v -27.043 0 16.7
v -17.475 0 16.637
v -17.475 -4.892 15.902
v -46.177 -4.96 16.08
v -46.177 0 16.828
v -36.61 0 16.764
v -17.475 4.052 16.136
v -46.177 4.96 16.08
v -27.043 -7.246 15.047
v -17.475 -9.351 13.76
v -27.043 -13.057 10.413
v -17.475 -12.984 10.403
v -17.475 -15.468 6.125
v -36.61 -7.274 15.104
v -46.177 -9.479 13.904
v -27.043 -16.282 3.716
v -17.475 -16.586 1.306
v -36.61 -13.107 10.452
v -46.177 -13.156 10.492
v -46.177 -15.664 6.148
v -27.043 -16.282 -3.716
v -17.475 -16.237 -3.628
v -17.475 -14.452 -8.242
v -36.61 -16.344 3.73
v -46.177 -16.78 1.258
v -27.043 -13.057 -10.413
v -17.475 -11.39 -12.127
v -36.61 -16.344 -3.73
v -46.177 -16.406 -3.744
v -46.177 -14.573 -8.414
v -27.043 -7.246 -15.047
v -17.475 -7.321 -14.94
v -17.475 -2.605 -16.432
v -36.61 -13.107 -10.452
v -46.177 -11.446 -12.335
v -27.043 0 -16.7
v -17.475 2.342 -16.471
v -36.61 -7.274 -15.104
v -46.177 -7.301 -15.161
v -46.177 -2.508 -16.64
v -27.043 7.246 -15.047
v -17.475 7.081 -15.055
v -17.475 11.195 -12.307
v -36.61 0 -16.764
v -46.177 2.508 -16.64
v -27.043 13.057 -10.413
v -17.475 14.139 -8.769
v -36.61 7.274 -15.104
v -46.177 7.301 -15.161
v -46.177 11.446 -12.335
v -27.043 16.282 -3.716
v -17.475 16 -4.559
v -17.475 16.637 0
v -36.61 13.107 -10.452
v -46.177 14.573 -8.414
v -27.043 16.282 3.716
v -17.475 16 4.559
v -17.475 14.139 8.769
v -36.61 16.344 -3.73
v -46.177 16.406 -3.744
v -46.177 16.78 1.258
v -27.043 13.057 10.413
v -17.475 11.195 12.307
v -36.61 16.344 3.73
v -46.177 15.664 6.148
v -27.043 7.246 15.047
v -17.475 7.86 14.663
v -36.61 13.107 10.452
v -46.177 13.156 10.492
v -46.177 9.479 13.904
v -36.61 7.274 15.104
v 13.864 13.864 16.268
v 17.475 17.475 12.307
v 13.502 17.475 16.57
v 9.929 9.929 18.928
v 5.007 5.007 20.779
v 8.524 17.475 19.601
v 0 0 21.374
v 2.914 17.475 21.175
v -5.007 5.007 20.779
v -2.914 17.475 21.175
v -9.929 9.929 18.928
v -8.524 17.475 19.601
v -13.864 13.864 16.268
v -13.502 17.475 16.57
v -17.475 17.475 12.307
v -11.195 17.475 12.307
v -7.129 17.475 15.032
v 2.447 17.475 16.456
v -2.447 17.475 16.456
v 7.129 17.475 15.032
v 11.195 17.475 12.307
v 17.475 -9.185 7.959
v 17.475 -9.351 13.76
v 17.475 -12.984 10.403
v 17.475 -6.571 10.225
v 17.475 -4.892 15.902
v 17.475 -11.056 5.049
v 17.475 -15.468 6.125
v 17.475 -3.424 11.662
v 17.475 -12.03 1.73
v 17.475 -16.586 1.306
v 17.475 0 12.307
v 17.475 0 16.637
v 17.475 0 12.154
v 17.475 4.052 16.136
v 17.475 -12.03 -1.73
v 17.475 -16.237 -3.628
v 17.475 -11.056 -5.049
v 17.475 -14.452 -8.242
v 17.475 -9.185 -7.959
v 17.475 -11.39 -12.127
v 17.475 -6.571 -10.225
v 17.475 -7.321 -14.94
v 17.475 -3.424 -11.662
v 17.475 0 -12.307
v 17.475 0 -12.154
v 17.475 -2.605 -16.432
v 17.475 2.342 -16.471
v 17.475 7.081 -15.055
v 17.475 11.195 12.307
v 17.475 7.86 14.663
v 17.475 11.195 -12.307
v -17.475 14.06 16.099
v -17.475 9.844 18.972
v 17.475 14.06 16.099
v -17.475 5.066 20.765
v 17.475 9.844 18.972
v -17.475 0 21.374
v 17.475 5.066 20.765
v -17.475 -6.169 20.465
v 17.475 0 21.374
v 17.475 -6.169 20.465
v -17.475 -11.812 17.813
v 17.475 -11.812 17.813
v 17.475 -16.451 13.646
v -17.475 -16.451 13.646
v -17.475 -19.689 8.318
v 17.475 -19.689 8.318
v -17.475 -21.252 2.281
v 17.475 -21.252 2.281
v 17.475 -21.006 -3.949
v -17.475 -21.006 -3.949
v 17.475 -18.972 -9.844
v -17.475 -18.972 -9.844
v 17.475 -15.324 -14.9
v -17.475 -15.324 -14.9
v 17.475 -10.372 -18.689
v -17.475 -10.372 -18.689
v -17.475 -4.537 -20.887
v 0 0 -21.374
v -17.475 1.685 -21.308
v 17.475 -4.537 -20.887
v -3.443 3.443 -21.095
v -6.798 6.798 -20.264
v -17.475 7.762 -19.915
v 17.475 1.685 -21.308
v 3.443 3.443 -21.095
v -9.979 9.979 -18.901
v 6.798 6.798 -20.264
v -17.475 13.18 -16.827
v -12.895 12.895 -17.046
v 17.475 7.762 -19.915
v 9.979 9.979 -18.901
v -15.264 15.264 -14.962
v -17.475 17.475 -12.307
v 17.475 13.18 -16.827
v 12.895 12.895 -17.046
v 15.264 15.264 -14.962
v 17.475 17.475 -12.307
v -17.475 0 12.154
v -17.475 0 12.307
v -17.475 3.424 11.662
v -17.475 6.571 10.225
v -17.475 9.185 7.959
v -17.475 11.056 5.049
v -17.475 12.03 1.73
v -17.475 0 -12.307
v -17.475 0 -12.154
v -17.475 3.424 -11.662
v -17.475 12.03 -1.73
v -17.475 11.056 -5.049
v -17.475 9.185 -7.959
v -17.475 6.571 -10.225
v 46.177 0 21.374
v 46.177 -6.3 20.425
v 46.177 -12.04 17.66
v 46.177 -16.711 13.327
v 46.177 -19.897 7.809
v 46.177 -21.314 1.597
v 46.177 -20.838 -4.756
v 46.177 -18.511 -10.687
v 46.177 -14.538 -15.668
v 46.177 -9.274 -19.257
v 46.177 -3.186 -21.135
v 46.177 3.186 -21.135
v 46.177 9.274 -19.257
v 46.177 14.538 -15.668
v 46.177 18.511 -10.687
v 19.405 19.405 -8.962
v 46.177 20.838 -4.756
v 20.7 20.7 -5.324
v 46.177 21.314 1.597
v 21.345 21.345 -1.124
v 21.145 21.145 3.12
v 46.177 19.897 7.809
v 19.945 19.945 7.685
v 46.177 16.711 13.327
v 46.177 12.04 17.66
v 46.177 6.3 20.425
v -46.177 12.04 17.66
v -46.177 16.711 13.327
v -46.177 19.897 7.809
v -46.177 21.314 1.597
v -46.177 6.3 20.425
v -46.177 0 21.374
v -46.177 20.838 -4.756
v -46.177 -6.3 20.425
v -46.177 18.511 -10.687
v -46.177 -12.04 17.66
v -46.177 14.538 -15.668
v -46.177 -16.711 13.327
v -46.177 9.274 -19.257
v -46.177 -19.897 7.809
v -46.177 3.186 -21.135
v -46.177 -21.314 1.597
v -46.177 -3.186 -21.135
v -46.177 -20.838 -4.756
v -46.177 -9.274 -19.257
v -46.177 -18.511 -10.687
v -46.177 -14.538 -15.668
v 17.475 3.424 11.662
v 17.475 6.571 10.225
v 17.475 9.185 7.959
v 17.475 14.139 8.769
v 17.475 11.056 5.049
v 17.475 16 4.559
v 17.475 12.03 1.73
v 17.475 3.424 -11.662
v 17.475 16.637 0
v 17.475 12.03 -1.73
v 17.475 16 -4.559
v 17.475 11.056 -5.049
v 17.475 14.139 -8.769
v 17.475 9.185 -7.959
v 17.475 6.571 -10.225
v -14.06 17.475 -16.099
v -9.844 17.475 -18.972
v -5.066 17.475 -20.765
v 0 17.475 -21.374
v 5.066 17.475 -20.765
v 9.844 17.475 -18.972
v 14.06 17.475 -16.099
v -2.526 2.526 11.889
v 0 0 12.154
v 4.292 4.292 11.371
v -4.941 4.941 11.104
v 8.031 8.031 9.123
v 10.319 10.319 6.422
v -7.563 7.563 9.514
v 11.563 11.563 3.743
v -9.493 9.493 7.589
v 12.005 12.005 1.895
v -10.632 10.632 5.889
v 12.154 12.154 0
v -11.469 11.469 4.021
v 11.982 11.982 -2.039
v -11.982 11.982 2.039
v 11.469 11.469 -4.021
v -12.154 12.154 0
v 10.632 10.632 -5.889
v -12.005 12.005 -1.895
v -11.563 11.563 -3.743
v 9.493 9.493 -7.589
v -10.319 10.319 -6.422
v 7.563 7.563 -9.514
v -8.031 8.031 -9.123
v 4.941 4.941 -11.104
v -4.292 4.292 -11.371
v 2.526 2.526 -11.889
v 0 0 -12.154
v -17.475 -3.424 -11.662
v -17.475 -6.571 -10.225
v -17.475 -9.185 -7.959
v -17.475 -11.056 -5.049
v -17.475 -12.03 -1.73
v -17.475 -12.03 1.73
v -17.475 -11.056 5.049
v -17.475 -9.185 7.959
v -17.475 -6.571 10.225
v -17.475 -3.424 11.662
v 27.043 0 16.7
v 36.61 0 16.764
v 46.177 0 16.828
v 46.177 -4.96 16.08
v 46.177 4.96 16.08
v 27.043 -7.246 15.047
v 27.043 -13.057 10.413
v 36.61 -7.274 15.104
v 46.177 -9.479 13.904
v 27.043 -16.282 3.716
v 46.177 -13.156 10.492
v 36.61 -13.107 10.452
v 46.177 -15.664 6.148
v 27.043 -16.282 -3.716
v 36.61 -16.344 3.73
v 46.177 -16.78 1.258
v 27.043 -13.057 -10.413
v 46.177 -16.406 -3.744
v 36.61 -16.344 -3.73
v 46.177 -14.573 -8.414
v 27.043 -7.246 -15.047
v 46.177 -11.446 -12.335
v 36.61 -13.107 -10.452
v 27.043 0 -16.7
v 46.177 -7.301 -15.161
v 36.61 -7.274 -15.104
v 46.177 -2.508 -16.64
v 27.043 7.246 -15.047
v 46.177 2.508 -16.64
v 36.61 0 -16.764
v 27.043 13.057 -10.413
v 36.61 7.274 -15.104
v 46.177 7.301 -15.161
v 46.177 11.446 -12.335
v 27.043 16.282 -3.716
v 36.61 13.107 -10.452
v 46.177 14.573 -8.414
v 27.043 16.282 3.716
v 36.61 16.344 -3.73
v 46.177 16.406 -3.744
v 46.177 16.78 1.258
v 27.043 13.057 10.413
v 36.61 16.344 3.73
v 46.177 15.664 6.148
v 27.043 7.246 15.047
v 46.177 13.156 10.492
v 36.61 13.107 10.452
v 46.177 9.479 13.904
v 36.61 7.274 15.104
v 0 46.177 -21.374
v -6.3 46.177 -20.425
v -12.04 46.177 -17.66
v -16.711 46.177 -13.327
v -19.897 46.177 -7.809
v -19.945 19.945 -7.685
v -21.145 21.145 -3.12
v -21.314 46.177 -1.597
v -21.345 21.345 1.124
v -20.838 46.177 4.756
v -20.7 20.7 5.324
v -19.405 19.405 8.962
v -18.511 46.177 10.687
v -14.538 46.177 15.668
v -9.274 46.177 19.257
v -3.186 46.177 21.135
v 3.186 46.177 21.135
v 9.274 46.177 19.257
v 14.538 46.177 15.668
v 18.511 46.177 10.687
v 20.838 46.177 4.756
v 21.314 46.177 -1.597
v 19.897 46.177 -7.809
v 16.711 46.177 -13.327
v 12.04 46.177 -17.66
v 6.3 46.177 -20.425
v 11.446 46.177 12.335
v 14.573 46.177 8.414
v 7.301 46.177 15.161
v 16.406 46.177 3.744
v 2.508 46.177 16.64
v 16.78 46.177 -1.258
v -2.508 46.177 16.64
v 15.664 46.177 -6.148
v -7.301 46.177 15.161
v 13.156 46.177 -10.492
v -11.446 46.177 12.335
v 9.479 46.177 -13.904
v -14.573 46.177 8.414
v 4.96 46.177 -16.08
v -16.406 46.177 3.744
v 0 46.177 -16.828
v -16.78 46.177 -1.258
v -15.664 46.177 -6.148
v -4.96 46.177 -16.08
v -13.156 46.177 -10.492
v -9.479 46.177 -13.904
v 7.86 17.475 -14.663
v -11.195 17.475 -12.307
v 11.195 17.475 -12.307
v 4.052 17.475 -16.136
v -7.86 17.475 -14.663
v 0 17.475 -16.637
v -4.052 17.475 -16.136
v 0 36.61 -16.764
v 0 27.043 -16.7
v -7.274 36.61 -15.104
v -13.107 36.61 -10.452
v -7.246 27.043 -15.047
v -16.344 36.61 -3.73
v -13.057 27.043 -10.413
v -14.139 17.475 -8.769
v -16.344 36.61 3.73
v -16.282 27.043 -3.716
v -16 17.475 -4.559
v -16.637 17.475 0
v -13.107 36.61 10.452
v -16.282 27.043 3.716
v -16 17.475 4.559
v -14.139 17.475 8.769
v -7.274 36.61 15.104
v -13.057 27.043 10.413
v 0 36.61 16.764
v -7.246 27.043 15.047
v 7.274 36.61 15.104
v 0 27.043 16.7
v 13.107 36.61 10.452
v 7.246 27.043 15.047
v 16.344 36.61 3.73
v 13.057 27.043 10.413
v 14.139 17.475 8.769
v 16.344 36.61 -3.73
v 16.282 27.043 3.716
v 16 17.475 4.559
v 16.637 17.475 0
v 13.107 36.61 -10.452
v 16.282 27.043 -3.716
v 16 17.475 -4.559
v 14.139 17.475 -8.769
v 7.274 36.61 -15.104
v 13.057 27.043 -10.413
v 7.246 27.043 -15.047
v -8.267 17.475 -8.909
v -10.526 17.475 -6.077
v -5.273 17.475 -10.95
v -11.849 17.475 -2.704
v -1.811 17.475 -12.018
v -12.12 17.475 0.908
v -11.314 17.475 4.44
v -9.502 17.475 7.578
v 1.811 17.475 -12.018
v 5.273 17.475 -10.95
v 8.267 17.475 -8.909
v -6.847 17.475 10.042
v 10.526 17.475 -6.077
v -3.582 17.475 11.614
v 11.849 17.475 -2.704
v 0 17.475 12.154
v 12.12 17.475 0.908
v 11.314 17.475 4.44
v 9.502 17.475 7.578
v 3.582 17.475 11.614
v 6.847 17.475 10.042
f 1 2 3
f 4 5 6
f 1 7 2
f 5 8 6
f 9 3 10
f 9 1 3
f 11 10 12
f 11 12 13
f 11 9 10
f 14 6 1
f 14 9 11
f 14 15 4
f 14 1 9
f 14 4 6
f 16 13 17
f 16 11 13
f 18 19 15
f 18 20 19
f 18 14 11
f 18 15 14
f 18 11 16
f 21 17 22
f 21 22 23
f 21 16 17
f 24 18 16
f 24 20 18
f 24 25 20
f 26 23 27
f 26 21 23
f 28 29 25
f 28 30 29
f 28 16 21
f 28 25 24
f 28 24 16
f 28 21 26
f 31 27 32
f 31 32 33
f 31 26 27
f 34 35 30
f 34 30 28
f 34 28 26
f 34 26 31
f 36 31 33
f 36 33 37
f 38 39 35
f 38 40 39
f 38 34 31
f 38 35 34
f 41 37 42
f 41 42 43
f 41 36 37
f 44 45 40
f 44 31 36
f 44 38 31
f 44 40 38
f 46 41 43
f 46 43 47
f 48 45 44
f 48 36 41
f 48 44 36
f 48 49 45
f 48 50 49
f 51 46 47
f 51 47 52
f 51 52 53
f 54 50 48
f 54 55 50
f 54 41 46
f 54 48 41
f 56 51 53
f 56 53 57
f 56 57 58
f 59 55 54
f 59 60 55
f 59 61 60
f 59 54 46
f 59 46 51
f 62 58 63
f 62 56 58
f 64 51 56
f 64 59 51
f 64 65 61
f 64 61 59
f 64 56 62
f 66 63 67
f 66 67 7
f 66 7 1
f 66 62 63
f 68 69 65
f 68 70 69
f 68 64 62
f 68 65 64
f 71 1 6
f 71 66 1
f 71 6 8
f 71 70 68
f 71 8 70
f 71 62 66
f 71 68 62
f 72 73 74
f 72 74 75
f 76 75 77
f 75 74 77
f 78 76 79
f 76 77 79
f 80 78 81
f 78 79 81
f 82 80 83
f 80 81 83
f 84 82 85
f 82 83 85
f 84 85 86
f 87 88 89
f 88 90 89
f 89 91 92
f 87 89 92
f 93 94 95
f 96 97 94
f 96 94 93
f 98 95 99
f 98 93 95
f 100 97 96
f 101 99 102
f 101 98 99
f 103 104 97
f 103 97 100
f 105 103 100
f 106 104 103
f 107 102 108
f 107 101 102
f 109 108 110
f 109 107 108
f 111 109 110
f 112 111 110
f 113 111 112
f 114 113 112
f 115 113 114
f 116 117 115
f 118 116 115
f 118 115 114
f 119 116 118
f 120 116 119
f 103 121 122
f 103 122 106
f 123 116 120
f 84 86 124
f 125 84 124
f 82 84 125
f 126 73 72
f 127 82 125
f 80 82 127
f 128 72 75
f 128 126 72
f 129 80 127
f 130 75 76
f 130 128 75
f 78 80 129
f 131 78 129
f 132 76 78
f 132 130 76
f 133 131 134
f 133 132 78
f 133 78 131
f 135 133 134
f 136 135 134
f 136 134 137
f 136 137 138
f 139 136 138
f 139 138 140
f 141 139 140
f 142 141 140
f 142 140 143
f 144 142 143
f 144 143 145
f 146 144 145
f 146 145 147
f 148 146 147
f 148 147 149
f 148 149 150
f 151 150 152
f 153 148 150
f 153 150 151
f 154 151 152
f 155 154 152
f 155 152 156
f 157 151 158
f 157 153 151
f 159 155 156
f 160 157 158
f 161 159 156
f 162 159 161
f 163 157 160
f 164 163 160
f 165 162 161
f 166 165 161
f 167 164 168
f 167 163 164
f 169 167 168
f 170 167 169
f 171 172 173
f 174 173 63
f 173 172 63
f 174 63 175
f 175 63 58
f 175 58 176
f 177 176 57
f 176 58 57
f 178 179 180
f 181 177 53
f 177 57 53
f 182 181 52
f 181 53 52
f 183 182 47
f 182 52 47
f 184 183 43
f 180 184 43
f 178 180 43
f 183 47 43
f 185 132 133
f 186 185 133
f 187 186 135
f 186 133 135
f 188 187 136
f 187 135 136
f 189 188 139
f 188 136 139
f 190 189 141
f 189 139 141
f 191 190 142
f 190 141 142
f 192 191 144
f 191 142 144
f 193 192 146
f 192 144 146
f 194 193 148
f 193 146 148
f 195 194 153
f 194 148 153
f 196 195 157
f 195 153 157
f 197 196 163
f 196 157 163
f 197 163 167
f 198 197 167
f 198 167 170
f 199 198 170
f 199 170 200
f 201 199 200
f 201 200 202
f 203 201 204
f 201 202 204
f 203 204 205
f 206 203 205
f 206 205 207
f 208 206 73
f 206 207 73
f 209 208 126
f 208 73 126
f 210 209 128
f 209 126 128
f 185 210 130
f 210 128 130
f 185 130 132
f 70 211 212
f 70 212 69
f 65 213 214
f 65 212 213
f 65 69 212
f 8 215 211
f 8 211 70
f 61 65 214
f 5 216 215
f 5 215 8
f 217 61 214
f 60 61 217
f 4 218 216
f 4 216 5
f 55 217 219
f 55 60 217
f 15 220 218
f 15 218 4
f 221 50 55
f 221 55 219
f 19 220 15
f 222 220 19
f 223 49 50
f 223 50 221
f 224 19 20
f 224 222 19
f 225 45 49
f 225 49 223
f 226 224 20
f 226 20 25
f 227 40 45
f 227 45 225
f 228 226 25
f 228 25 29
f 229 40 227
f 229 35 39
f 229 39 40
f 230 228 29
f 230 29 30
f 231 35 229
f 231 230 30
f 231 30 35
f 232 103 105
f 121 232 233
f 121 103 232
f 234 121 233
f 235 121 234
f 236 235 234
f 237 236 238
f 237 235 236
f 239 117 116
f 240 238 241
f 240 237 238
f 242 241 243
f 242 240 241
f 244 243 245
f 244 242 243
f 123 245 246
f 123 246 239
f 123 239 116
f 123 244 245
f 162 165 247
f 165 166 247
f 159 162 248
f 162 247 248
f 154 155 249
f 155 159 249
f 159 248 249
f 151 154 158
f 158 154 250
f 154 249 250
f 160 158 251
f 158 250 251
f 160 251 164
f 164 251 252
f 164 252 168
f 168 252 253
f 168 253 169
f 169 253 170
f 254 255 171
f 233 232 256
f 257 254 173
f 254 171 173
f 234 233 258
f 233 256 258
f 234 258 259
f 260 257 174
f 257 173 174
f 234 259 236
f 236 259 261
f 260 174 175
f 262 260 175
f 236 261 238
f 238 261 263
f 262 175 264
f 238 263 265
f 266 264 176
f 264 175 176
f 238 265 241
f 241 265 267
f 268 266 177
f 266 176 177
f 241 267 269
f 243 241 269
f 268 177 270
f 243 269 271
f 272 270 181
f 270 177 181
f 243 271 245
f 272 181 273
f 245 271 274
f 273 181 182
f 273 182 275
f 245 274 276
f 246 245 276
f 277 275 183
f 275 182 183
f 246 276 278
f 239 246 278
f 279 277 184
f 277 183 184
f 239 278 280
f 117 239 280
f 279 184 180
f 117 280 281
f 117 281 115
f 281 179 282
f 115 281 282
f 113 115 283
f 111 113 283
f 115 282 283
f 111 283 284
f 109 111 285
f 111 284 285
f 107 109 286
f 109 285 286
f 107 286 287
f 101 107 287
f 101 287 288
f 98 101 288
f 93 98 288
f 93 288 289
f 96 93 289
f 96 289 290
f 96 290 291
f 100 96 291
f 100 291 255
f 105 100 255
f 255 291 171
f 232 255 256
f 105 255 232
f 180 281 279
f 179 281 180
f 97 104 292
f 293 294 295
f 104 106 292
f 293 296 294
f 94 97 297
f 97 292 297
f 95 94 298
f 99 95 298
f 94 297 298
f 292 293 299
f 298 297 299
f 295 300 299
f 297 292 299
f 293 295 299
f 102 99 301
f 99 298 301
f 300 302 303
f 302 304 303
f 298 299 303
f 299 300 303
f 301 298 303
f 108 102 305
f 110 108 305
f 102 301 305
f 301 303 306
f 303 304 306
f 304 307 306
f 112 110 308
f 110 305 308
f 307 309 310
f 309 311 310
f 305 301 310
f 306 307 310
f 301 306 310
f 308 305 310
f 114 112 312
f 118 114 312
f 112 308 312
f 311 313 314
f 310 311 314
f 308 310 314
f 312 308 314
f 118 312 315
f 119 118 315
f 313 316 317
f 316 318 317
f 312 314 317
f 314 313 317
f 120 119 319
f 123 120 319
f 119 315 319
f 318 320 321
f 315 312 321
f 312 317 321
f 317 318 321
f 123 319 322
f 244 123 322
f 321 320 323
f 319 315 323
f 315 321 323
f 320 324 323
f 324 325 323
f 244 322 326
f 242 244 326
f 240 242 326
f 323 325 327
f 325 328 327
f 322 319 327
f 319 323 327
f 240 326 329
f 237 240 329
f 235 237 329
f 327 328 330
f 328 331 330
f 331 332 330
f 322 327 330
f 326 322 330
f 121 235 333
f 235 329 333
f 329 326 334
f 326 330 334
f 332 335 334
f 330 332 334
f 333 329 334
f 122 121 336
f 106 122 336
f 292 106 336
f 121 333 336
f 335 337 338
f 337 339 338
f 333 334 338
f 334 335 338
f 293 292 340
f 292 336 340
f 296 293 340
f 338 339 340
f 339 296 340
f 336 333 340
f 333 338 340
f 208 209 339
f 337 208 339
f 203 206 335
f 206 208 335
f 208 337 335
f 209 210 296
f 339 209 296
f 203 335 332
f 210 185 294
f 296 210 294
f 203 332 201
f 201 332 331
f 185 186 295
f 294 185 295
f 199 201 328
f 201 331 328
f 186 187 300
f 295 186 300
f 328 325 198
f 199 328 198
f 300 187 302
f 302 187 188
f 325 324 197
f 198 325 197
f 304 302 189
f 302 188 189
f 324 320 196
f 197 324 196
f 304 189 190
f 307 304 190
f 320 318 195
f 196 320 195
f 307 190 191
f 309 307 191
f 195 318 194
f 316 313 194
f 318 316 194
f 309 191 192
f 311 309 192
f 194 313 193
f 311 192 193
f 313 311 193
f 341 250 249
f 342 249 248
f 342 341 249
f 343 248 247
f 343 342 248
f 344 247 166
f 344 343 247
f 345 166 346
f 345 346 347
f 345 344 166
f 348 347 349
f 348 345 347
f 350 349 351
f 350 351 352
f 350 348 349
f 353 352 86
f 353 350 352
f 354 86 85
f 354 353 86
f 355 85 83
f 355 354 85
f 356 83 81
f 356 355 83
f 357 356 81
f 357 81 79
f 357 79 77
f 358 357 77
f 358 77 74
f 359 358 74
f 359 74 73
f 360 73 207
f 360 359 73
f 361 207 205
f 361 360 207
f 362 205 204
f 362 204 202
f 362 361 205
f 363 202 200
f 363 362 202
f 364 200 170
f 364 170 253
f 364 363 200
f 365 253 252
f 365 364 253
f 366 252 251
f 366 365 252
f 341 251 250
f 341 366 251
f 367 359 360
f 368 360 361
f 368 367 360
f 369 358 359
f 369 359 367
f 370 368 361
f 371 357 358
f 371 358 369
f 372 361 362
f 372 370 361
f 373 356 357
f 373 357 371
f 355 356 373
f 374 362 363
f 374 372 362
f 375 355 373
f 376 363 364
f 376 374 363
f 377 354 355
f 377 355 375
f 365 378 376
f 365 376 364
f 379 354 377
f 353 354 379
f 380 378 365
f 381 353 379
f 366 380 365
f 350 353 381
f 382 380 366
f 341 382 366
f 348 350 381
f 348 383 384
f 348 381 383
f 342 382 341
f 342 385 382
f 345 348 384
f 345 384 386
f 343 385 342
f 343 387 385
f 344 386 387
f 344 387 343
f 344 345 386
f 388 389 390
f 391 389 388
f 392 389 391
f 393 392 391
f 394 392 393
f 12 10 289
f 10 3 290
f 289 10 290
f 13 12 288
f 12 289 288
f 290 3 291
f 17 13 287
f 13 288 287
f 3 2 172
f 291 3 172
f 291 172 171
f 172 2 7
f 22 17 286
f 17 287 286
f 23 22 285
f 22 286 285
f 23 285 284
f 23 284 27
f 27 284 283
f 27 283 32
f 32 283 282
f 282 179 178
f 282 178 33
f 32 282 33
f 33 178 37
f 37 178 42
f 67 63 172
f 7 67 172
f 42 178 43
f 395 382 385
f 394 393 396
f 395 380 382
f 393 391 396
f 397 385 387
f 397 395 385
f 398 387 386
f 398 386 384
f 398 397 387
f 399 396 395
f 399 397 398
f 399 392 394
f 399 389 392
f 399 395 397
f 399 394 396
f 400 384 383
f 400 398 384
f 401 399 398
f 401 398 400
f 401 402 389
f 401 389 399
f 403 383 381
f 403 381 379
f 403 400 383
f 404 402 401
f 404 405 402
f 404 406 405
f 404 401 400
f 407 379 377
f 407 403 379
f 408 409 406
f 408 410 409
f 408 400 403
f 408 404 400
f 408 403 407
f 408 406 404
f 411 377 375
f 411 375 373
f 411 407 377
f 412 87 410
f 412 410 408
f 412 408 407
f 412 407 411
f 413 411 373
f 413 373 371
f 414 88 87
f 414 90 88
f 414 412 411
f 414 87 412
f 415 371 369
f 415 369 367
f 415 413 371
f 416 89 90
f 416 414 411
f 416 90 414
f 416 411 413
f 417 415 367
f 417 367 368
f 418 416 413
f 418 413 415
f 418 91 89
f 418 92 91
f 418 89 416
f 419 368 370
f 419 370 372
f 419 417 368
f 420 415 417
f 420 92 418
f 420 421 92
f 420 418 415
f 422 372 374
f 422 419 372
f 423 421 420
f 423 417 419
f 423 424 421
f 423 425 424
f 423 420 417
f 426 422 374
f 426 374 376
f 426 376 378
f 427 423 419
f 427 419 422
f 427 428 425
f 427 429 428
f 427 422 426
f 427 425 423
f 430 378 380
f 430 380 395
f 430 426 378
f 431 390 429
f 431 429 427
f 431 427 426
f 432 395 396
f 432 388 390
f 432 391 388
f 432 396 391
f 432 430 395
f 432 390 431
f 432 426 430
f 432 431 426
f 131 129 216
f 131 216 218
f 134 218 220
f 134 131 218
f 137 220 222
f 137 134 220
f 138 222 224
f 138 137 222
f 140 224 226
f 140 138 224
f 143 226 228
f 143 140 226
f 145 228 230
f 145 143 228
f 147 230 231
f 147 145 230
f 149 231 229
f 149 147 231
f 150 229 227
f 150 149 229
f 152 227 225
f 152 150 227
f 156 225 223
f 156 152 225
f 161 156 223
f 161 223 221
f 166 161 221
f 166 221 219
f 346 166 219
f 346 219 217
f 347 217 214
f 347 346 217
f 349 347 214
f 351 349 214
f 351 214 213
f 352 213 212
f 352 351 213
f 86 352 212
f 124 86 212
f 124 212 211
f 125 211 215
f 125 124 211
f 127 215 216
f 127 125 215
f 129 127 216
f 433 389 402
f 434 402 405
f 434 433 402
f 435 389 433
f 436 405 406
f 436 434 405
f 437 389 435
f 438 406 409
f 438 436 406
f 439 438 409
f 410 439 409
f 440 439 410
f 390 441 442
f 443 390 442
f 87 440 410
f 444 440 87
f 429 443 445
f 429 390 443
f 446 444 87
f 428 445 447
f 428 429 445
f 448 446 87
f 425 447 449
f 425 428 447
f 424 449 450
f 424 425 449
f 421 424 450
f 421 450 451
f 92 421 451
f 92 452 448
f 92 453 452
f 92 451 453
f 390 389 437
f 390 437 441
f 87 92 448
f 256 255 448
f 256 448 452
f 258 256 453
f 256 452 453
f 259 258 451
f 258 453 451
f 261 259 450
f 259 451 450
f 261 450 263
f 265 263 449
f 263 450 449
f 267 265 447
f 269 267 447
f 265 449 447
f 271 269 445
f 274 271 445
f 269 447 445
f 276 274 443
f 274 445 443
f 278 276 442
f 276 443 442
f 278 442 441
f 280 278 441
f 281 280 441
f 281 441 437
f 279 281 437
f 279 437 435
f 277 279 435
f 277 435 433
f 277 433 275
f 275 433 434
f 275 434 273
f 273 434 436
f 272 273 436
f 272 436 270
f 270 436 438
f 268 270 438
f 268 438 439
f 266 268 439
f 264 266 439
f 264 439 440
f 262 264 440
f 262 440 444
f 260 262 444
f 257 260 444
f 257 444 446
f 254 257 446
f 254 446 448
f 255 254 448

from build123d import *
from build123d.topology import SkipClean

# Parameters (mm, degrees)
BOSS_EXTRUDE1_START     = 34.9504
BOSS_EXTRUDE1_DEPTH     = 34.9504
BOSS_EXTRUDE2_DEPTH     = 17.4752001
SKETCH5_R               = 12.1539
CUT_EXTRUDE1_DEPTH      = 34.9504
CUT_EXTRUDE2_REACH      = 66.019
CUT_EXTRUDE2_END_RADIUS = 12.1539
SKETCH6_R               = 12.1539


# Read off the part's stored shape, not the designer's step: Boss-Extrude2
with BuildPart() as part:
    # Sketch1 → Revolve1 (revolve)
    with BuildSketch(Plane.XY, mode=Mode.PRIVATE) as revolve1_sk:
        Polygon((-46.1772, -21.3741), (-17.4752, -21.3741), (-17.4752, -16.637), (-46.1772, -16.8275), align=None)
    revolve(revolve1_sk.sketch.rotate(Axis((-46.1772, 0, 0), (1, 0, 0)), 270), axis=Axis((-46.1772, 0, 0), (1, 0, 0)))


with BuildPart() as body_2:
    # Mirror1: mirrored copy
    add(part.part.mirror(Plane(origin=(0, 0, 0), x_dir=(0, 0, 1), z_dir=(1, 0, 0))))


with BuildPart() as body_3:
    # Sketch2 → Revolve2 (revolve)
    with BuildSketch(Plane.XY, mode=Mode.PRIVATE) as revolve2_sk:
        Polygon((16.8275, 46.1772), (16.637, 17.4752), (21.3741, 17.4752), (21.3741, 46.1772), align=None)
    revolve(revolve2_sk.sketch.rotate(Axis((0, 0, 0), (0, 1, 0)), 90), axis=Axis((0, 0, 0), (0, 1, 0)))


with BuildPart() as part_1:
    with SkipClean():  # the faces are left unmerged after this step: merging them gives an invalid solid
        add(part.part)

        add(body_2.part)  # Boss-Extrude1 merges body 2

        add(body_3.part)  # Boss-Extrude1 merges body 3
        # Sketch3 → Boss-Extrude1 (add)
        with BuildSketch(Plane(origin=(-17.4752, 0, 0), x_dir=(0, 0, -1), z_dir=(1, 0, 0)).offset(BOSS_EXTRUDE1_START)):
            with BuildLine():
                Line((12.307296038, 17.4752), (-12.307296038, 17.4752))
                ThreePointArc((-12.307296038, 17.4752), (0, -21.3741), (12.307296038, 17.4752))
            make_face()
        extrude(amount=-BOSS_EXTRUDE1_DEPTH)

    # Boss-Extrude2 outline → Boss-Extrude2 (add)
    with SkipClean():  # the faces are left unmerged after this step: merging them gives an invalid solid
        with BuildSketch(Plane.XZ.offset(-17.4752)):
            with BuildLine():
                ThreePointArc((-17.4752, -12.307296038), (0, -21.3741), (17.4752, -12.307296038))
                Line((17.4752, -12.307296038), (17.4752, 12.307296038))
                ThreePointArc((17.4752, 12.307296038), (0, 21.3741), (-17.4752, 12.307296038))
                Line((-17.4752, 12.307296038), (-17.4752, -12.307296038))
            make_face()
        extrude(amount=BOSS_EXTRUDE2_DEPTH)

    # Sketch5 → Cut-Extrude1 (cut)
    with SkipClean():  # the faces are left unmerged after this step: merging them gives an invalid solid
        with BuildSketch(Plane.ZY.offset(17.4752)):
            Circle(SKETCH5_R)
        extrude(amount=-CUT_EXTRUDE1_DEPTH, mode=Mode.SUBTRACT)

    # Cut-Extrude2: up to this cylinder (the profile starts outside it)
    with SkipClean():  # the faces are left unmerged after this step: merging them gives an invalid solid
        cut_extrude2_end = Plane(origin=(0, 0, 0), z_dir=(-1, 0, 0)) * Cylinder(CUT_EXTRUDE2_END_RADIUS, 157.3458, mode=Mode.PRIVATE)
        # Sketch6 → Cut-Extrude2 (cut, up to the surface)
        with BuildSketch(Plane(origin=(0, 17.4752, 0), x_dir=(1, 0, 0), z_dir=(0, 1, 0)), mode=Mode.PRIVATE) as cut_extrude2_sk1:
            with Locations(Location((0, 0, 0), (0, 0, 270))):
                Circle(SKETCH6_R)
        cut_extrude2_tool1 = extrude(cut_extrude2_sk1.sketch, amount=-CUT_EXTRUDE2_REACH, mode=Mode.PRIVATE) - cut_extrude2_end
        add(cut_extrude2_tool1.solids().sort_by_distance((0, 17.4752, 0))[0], mode=Mode.SUBTRACT)


solid = part_1.part
